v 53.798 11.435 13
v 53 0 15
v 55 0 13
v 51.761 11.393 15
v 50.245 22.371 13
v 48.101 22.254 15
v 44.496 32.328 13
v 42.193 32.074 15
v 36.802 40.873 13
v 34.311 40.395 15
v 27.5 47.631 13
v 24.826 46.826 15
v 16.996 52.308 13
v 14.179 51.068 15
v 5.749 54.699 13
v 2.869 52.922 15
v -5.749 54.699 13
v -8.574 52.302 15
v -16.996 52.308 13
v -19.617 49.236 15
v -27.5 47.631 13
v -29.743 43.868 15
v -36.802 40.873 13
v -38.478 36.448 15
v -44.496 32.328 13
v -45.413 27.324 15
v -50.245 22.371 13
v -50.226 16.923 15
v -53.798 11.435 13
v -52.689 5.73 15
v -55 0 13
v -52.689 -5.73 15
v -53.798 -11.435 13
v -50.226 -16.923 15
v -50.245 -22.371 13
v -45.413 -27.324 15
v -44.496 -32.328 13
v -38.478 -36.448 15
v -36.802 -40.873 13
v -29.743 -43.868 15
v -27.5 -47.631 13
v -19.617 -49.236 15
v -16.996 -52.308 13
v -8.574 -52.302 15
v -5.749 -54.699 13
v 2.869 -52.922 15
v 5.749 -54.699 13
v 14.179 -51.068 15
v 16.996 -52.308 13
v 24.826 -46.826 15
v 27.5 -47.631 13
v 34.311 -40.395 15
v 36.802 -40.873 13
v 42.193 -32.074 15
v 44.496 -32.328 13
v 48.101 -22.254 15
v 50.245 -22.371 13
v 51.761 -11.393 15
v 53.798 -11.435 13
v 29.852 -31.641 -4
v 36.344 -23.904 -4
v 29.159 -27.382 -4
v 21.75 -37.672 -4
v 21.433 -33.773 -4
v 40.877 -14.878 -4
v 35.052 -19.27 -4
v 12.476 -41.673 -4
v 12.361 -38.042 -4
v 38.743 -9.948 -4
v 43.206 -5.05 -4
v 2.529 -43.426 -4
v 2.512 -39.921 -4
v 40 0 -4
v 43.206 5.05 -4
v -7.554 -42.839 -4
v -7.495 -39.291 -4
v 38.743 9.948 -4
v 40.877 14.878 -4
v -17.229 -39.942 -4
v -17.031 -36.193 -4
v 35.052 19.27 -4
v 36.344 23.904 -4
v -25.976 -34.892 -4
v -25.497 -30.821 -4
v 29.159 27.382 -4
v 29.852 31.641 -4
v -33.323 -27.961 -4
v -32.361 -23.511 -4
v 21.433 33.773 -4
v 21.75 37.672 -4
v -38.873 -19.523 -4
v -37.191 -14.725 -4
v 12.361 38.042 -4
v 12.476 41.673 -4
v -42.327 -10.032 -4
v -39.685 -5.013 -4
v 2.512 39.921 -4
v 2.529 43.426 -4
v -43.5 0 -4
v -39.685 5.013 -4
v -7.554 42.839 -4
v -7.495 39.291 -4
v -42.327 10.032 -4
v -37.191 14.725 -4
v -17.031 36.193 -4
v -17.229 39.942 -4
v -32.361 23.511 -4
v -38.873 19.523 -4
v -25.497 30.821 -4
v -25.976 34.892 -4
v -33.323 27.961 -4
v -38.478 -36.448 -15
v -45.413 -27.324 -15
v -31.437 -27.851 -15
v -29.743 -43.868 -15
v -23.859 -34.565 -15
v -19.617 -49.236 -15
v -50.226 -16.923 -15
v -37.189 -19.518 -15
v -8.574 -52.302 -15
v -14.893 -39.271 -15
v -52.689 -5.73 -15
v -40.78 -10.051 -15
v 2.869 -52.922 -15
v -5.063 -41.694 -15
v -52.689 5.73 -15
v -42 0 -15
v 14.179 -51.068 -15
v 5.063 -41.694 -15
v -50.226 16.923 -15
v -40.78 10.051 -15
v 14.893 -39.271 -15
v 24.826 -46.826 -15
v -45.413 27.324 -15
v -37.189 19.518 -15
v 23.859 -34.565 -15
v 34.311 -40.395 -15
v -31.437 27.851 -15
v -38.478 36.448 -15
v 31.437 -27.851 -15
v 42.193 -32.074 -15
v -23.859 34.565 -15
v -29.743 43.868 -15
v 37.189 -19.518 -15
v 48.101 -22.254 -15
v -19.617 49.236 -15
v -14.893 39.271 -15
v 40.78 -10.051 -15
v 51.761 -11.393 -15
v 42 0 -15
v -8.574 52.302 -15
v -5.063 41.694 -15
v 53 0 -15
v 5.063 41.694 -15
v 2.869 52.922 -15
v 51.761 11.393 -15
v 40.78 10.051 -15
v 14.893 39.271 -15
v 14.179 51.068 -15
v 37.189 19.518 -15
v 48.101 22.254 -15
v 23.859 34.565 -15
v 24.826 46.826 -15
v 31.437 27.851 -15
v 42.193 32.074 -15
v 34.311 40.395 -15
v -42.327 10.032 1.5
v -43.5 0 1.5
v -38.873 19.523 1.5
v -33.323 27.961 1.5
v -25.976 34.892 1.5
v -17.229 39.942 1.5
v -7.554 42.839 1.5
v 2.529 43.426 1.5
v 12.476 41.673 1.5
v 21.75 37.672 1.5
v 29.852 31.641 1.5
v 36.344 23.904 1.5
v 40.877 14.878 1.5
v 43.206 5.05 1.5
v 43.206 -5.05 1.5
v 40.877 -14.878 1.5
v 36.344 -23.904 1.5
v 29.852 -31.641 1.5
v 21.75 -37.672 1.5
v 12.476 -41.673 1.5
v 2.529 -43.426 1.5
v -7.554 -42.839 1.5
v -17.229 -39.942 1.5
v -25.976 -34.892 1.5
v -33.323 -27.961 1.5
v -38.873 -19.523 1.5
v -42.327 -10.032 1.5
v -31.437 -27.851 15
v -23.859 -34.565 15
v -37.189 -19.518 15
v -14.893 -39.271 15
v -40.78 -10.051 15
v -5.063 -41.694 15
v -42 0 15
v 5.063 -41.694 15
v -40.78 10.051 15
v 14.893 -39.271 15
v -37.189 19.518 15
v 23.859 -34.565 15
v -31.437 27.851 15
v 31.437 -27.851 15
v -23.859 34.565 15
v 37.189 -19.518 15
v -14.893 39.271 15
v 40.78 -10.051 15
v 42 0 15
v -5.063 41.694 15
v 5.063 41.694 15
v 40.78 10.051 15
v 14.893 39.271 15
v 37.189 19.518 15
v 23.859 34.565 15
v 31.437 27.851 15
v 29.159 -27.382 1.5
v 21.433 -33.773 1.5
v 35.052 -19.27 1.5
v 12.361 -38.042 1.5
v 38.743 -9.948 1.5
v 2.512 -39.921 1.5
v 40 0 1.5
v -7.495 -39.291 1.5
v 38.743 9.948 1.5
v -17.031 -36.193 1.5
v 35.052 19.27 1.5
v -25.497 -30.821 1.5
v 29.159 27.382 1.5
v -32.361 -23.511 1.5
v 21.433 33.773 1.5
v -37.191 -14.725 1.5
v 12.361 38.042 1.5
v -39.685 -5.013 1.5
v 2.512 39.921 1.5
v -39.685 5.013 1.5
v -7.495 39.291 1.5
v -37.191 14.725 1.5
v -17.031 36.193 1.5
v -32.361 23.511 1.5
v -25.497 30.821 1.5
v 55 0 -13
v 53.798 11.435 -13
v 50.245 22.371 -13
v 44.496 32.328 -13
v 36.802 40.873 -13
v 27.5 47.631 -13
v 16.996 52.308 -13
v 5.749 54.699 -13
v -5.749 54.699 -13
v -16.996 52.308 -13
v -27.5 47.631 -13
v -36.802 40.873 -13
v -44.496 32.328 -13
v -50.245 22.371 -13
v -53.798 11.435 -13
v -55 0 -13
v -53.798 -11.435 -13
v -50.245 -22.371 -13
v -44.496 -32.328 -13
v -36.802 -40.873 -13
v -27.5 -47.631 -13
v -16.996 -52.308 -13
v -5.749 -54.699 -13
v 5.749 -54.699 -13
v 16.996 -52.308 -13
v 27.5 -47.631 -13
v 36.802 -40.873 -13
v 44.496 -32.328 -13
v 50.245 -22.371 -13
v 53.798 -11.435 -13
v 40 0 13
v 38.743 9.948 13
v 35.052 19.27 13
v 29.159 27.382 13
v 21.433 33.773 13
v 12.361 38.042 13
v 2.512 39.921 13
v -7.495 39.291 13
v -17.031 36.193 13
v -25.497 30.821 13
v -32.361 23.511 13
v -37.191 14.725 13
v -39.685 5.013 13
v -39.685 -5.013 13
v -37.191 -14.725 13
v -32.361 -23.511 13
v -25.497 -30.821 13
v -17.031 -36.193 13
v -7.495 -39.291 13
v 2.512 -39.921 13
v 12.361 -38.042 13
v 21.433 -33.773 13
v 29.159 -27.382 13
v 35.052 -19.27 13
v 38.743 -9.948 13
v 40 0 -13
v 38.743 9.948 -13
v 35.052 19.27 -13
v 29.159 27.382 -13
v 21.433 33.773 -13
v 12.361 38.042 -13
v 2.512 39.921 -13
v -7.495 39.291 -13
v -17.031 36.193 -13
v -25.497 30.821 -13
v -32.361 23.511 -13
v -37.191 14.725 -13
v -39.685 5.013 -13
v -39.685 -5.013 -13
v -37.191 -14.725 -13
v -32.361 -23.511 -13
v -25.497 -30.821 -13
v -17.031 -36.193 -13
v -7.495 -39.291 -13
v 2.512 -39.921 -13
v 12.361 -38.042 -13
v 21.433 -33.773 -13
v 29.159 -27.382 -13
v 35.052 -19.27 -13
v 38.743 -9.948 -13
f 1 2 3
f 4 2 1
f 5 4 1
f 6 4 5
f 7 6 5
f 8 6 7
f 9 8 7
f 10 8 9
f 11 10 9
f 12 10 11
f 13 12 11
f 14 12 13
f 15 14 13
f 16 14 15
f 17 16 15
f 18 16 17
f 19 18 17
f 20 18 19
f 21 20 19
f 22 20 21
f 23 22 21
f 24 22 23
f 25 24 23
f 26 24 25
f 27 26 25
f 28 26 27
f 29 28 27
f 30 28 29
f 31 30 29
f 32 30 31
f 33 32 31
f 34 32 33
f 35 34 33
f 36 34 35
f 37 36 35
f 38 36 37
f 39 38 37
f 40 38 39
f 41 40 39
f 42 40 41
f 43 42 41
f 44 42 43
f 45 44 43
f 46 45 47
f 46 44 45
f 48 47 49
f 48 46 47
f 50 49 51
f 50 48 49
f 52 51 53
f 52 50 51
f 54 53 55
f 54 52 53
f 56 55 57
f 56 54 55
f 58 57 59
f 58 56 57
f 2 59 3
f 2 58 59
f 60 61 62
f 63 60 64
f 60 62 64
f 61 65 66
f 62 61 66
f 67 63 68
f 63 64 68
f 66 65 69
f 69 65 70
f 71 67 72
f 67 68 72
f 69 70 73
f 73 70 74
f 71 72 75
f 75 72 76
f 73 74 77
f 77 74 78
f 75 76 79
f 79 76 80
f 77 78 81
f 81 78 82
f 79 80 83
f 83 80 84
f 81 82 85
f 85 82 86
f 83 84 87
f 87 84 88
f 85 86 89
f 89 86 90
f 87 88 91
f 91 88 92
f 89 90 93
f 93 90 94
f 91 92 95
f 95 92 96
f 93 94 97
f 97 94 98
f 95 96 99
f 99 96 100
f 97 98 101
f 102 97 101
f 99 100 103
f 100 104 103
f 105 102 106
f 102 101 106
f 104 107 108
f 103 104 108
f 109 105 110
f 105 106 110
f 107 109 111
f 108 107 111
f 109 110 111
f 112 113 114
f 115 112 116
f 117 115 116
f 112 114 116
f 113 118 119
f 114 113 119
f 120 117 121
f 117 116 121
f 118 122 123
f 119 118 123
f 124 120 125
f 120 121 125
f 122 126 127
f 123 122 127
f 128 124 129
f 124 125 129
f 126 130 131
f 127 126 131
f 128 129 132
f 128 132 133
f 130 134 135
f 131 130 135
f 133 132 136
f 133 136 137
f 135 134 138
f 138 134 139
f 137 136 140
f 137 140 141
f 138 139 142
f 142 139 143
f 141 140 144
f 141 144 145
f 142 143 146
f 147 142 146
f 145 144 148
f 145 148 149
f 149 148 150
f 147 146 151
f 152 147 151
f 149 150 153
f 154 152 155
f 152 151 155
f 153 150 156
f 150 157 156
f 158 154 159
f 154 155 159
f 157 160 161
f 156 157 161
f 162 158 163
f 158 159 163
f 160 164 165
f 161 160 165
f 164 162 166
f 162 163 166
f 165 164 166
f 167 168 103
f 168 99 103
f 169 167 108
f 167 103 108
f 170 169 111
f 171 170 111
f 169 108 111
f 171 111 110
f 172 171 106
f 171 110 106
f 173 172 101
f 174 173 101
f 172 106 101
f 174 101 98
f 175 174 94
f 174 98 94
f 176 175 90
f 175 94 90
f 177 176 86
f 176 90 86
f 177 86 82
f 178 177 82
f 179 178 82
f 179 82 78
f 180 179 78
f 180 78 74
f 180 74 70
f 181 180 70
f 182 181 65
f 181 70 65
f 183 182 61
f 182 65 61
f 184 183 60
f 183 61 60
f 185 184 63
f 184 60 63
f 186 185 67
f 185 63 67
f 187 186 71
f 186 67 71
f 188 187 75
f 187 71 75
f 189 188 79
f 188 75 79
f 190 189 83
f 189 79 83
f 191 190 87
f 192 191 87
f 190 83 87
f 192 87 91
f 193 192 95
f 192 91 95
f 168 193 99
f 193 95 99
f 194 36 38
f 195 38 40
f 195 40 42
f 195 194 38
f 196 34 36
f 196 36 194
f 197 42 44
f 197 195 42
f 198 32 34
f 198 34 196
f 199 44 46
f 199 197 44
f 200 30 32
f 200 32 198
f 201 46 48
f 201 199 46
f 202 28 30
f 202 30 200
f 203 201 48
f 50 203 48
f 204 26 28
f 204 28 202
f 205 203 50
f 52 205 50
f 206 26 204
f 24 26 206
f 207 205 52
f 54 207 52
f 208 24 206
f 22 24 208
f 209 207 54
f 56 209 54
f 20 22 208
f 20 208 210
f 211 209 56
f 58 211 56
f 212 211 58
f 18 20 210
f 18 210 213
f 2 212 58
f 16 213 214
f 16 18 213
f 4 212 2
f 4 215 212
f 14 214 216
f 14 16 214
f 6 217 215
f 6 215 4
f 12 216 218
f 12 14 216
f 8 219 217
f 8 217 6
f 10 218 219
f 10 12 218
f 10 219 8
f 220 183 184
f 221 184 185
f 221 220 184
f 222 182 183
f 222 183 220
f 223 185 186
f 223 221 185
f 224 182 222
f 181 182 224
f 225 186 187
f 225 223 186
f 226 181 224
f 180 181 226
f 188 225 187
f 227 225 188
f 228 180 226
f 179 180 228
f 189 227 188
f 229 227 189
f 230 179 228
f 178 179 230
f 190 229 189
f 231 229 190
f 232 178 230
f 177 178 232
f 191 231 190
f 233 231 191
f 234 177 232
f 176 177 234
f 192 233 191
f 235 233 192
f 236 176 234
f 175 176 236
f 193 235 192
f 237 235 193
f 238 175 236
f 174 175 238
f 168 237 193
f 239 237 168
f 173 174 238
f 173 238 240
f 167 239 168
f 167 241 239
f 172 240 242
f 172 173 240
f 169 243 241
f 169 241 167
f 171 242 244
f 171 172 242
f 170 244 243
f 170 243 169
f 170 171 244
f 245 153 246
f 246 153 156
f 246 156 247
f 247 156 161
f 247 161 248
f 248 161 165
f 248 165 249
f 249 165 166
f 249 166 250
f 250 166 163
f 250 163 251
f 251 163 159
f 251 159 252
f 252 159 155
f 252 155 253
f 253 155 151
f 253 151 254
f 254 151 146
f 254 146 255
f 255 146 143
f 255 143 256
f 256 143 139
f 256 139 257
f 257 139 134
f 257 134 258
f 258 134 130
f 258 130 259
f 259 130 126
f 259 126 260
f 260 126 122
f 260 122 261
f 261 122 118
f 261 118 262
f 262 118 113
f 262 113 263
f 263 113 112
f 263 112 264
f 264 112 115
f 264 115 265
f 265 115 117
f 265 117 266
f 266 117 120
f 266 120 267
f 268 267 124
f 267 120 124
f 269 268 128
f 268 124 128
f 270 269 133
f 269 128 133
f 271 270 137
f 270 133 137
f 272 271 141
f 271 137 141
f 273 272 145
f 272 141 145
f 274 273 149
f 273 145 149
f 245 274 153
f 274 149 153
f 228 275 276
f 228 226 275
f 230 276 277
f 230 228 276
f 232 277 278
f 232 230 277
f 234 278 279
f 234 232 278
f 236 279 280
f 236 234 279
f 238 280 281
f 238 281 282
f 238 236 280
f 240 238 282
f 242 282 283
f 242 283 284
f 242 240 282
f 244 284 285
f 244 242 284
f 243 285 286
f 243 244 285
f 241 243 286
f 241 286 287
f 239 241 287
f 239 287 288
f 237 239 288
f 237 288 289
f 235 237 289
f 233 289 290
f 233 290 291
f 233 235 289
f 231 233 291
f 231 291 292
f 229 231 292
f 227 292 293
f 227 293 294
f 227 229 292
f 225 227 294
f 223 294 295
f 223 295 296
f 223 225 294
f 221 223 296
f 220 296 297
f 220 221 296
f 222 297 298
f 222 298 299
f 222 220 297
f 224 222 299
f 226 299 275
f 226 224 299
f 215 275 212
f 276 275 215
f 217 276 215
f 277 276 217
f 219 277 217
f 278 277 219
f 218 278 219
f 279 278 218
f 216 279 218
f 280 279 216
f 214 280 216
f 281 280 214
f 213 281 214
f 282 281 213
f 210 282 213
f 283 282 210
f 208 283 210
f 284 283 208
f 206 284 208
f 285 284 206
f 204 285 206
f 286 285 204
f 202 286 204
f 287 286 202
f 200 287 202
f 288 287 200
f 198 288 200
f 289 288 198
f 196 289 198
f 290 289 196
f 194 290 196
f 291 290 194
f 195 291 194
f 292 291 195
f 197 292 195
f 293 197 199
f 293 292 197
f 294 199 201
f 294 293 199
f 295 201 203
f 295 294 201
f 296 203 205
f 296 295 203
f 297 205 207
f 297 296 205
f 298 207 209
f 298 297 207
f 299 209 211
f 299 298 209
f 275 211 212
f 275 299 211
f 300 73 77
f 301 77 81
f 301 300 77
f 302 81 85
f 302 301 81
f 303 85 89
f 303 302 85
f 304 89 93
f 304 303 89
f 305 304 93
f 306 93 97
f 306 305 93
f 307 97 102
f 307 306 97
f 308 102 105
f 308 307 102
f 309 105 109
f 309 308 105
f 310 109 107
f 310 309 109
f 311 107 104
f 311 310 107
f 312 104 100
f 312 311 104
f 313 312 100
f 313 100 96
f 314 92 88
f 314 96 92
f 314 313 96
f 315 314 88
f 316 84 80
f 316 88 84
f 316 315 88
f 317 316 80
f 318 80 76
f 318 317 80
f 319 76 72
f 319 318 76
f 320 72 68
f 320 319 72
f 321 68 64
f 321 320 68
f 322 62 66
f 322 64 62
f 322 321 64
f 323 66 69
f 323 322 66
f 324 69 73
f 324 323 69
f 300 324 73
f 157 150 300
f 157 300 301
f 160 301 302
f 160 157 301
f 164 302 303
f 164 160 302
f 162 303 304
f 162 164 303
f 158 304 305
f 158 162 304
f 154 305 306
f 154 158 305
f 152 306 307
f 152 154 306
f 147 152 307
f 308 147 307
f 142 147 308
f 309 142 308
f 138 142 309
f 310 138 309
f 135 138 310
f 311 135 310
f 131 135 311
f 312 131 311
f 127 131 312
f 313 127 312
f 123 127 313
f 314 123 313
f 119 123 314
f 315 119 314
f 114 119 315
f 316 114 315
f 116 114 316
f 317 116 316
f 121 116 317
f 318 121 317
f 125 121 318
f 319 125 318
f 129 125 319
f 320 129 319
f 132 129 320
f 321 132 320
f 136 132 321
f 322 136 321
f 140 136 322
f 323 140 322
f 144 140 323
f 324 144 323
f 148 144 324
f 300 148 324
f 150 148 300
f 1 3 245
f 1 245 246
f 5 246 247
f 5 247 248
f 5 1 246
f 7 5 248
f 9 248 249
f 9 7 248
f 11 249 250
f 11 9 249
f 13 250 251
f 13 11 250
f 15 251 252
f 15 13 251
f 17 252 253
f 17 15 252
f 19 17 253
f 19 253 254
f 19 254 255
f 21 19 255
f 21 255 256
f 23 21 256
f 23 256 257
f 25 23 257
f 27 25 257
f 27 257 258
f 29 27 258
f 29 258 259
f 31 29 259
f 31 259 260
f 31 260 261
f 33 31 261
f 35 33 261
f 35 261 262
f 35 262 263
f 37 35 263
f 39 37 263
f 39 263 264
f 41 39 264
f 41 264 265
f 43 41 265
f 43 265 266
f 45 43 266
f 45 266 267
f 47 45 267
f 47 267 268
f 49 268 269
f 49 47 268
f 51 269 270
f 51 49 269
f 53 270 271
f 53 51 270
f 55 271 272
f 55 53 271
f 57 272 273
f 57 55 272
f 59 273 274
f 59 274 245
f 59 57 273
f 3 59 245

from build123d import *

# Parameters (mm, degrees)
SKETCH1_R           = 55
SKETCH1_R_2         = 40
BOSS_EXTRUDE1_DEPTH = 15
CHAMFER1_SIZE       = 2
SKETCH2_W           = 7.914202957
SKETCH2_H           = 5.5


with BuildPart() as part:
    # Sketch1 → Boss-Extrude1 (new body, symmetric)
    with BuildSketch(Plane.XY):
        Circle(SKETCH1_R)
        Circle(SKETCH1_R_2, mode=Mode.SUBTRACT)
    extrude(amount=BOSS_EXTRUDE1_DEPTH, both=True)

    # Chamfer1
    chamfer1_edges = [part.edges().sort_by_distance(p)[0] for p in [
        (-55, 0, -15),
        (-55, 0, 15),
        (-40, 0, -15),
        (-40, 0, 15),
    ]]
    chamfer(chamfer1_edges, length=CHAMFER1_SIZE)

    # Sketch2 → Cut-Revolve1 (revolve, cut)
    with BuildSketch(Plane(origin=(0, 0, 0), x_dir=(1, 0, 0), z_dir=(0, 1, 0))):
        with Locations((-39.542898521, 1.25)):
            Rectangle(SKETCH2_W, SKETCH2_H)
    revolve(axis=Axis((0, 0, 0), (0, 0, -1)), mode=Mode.SUBTRACT)


solid = part.part
